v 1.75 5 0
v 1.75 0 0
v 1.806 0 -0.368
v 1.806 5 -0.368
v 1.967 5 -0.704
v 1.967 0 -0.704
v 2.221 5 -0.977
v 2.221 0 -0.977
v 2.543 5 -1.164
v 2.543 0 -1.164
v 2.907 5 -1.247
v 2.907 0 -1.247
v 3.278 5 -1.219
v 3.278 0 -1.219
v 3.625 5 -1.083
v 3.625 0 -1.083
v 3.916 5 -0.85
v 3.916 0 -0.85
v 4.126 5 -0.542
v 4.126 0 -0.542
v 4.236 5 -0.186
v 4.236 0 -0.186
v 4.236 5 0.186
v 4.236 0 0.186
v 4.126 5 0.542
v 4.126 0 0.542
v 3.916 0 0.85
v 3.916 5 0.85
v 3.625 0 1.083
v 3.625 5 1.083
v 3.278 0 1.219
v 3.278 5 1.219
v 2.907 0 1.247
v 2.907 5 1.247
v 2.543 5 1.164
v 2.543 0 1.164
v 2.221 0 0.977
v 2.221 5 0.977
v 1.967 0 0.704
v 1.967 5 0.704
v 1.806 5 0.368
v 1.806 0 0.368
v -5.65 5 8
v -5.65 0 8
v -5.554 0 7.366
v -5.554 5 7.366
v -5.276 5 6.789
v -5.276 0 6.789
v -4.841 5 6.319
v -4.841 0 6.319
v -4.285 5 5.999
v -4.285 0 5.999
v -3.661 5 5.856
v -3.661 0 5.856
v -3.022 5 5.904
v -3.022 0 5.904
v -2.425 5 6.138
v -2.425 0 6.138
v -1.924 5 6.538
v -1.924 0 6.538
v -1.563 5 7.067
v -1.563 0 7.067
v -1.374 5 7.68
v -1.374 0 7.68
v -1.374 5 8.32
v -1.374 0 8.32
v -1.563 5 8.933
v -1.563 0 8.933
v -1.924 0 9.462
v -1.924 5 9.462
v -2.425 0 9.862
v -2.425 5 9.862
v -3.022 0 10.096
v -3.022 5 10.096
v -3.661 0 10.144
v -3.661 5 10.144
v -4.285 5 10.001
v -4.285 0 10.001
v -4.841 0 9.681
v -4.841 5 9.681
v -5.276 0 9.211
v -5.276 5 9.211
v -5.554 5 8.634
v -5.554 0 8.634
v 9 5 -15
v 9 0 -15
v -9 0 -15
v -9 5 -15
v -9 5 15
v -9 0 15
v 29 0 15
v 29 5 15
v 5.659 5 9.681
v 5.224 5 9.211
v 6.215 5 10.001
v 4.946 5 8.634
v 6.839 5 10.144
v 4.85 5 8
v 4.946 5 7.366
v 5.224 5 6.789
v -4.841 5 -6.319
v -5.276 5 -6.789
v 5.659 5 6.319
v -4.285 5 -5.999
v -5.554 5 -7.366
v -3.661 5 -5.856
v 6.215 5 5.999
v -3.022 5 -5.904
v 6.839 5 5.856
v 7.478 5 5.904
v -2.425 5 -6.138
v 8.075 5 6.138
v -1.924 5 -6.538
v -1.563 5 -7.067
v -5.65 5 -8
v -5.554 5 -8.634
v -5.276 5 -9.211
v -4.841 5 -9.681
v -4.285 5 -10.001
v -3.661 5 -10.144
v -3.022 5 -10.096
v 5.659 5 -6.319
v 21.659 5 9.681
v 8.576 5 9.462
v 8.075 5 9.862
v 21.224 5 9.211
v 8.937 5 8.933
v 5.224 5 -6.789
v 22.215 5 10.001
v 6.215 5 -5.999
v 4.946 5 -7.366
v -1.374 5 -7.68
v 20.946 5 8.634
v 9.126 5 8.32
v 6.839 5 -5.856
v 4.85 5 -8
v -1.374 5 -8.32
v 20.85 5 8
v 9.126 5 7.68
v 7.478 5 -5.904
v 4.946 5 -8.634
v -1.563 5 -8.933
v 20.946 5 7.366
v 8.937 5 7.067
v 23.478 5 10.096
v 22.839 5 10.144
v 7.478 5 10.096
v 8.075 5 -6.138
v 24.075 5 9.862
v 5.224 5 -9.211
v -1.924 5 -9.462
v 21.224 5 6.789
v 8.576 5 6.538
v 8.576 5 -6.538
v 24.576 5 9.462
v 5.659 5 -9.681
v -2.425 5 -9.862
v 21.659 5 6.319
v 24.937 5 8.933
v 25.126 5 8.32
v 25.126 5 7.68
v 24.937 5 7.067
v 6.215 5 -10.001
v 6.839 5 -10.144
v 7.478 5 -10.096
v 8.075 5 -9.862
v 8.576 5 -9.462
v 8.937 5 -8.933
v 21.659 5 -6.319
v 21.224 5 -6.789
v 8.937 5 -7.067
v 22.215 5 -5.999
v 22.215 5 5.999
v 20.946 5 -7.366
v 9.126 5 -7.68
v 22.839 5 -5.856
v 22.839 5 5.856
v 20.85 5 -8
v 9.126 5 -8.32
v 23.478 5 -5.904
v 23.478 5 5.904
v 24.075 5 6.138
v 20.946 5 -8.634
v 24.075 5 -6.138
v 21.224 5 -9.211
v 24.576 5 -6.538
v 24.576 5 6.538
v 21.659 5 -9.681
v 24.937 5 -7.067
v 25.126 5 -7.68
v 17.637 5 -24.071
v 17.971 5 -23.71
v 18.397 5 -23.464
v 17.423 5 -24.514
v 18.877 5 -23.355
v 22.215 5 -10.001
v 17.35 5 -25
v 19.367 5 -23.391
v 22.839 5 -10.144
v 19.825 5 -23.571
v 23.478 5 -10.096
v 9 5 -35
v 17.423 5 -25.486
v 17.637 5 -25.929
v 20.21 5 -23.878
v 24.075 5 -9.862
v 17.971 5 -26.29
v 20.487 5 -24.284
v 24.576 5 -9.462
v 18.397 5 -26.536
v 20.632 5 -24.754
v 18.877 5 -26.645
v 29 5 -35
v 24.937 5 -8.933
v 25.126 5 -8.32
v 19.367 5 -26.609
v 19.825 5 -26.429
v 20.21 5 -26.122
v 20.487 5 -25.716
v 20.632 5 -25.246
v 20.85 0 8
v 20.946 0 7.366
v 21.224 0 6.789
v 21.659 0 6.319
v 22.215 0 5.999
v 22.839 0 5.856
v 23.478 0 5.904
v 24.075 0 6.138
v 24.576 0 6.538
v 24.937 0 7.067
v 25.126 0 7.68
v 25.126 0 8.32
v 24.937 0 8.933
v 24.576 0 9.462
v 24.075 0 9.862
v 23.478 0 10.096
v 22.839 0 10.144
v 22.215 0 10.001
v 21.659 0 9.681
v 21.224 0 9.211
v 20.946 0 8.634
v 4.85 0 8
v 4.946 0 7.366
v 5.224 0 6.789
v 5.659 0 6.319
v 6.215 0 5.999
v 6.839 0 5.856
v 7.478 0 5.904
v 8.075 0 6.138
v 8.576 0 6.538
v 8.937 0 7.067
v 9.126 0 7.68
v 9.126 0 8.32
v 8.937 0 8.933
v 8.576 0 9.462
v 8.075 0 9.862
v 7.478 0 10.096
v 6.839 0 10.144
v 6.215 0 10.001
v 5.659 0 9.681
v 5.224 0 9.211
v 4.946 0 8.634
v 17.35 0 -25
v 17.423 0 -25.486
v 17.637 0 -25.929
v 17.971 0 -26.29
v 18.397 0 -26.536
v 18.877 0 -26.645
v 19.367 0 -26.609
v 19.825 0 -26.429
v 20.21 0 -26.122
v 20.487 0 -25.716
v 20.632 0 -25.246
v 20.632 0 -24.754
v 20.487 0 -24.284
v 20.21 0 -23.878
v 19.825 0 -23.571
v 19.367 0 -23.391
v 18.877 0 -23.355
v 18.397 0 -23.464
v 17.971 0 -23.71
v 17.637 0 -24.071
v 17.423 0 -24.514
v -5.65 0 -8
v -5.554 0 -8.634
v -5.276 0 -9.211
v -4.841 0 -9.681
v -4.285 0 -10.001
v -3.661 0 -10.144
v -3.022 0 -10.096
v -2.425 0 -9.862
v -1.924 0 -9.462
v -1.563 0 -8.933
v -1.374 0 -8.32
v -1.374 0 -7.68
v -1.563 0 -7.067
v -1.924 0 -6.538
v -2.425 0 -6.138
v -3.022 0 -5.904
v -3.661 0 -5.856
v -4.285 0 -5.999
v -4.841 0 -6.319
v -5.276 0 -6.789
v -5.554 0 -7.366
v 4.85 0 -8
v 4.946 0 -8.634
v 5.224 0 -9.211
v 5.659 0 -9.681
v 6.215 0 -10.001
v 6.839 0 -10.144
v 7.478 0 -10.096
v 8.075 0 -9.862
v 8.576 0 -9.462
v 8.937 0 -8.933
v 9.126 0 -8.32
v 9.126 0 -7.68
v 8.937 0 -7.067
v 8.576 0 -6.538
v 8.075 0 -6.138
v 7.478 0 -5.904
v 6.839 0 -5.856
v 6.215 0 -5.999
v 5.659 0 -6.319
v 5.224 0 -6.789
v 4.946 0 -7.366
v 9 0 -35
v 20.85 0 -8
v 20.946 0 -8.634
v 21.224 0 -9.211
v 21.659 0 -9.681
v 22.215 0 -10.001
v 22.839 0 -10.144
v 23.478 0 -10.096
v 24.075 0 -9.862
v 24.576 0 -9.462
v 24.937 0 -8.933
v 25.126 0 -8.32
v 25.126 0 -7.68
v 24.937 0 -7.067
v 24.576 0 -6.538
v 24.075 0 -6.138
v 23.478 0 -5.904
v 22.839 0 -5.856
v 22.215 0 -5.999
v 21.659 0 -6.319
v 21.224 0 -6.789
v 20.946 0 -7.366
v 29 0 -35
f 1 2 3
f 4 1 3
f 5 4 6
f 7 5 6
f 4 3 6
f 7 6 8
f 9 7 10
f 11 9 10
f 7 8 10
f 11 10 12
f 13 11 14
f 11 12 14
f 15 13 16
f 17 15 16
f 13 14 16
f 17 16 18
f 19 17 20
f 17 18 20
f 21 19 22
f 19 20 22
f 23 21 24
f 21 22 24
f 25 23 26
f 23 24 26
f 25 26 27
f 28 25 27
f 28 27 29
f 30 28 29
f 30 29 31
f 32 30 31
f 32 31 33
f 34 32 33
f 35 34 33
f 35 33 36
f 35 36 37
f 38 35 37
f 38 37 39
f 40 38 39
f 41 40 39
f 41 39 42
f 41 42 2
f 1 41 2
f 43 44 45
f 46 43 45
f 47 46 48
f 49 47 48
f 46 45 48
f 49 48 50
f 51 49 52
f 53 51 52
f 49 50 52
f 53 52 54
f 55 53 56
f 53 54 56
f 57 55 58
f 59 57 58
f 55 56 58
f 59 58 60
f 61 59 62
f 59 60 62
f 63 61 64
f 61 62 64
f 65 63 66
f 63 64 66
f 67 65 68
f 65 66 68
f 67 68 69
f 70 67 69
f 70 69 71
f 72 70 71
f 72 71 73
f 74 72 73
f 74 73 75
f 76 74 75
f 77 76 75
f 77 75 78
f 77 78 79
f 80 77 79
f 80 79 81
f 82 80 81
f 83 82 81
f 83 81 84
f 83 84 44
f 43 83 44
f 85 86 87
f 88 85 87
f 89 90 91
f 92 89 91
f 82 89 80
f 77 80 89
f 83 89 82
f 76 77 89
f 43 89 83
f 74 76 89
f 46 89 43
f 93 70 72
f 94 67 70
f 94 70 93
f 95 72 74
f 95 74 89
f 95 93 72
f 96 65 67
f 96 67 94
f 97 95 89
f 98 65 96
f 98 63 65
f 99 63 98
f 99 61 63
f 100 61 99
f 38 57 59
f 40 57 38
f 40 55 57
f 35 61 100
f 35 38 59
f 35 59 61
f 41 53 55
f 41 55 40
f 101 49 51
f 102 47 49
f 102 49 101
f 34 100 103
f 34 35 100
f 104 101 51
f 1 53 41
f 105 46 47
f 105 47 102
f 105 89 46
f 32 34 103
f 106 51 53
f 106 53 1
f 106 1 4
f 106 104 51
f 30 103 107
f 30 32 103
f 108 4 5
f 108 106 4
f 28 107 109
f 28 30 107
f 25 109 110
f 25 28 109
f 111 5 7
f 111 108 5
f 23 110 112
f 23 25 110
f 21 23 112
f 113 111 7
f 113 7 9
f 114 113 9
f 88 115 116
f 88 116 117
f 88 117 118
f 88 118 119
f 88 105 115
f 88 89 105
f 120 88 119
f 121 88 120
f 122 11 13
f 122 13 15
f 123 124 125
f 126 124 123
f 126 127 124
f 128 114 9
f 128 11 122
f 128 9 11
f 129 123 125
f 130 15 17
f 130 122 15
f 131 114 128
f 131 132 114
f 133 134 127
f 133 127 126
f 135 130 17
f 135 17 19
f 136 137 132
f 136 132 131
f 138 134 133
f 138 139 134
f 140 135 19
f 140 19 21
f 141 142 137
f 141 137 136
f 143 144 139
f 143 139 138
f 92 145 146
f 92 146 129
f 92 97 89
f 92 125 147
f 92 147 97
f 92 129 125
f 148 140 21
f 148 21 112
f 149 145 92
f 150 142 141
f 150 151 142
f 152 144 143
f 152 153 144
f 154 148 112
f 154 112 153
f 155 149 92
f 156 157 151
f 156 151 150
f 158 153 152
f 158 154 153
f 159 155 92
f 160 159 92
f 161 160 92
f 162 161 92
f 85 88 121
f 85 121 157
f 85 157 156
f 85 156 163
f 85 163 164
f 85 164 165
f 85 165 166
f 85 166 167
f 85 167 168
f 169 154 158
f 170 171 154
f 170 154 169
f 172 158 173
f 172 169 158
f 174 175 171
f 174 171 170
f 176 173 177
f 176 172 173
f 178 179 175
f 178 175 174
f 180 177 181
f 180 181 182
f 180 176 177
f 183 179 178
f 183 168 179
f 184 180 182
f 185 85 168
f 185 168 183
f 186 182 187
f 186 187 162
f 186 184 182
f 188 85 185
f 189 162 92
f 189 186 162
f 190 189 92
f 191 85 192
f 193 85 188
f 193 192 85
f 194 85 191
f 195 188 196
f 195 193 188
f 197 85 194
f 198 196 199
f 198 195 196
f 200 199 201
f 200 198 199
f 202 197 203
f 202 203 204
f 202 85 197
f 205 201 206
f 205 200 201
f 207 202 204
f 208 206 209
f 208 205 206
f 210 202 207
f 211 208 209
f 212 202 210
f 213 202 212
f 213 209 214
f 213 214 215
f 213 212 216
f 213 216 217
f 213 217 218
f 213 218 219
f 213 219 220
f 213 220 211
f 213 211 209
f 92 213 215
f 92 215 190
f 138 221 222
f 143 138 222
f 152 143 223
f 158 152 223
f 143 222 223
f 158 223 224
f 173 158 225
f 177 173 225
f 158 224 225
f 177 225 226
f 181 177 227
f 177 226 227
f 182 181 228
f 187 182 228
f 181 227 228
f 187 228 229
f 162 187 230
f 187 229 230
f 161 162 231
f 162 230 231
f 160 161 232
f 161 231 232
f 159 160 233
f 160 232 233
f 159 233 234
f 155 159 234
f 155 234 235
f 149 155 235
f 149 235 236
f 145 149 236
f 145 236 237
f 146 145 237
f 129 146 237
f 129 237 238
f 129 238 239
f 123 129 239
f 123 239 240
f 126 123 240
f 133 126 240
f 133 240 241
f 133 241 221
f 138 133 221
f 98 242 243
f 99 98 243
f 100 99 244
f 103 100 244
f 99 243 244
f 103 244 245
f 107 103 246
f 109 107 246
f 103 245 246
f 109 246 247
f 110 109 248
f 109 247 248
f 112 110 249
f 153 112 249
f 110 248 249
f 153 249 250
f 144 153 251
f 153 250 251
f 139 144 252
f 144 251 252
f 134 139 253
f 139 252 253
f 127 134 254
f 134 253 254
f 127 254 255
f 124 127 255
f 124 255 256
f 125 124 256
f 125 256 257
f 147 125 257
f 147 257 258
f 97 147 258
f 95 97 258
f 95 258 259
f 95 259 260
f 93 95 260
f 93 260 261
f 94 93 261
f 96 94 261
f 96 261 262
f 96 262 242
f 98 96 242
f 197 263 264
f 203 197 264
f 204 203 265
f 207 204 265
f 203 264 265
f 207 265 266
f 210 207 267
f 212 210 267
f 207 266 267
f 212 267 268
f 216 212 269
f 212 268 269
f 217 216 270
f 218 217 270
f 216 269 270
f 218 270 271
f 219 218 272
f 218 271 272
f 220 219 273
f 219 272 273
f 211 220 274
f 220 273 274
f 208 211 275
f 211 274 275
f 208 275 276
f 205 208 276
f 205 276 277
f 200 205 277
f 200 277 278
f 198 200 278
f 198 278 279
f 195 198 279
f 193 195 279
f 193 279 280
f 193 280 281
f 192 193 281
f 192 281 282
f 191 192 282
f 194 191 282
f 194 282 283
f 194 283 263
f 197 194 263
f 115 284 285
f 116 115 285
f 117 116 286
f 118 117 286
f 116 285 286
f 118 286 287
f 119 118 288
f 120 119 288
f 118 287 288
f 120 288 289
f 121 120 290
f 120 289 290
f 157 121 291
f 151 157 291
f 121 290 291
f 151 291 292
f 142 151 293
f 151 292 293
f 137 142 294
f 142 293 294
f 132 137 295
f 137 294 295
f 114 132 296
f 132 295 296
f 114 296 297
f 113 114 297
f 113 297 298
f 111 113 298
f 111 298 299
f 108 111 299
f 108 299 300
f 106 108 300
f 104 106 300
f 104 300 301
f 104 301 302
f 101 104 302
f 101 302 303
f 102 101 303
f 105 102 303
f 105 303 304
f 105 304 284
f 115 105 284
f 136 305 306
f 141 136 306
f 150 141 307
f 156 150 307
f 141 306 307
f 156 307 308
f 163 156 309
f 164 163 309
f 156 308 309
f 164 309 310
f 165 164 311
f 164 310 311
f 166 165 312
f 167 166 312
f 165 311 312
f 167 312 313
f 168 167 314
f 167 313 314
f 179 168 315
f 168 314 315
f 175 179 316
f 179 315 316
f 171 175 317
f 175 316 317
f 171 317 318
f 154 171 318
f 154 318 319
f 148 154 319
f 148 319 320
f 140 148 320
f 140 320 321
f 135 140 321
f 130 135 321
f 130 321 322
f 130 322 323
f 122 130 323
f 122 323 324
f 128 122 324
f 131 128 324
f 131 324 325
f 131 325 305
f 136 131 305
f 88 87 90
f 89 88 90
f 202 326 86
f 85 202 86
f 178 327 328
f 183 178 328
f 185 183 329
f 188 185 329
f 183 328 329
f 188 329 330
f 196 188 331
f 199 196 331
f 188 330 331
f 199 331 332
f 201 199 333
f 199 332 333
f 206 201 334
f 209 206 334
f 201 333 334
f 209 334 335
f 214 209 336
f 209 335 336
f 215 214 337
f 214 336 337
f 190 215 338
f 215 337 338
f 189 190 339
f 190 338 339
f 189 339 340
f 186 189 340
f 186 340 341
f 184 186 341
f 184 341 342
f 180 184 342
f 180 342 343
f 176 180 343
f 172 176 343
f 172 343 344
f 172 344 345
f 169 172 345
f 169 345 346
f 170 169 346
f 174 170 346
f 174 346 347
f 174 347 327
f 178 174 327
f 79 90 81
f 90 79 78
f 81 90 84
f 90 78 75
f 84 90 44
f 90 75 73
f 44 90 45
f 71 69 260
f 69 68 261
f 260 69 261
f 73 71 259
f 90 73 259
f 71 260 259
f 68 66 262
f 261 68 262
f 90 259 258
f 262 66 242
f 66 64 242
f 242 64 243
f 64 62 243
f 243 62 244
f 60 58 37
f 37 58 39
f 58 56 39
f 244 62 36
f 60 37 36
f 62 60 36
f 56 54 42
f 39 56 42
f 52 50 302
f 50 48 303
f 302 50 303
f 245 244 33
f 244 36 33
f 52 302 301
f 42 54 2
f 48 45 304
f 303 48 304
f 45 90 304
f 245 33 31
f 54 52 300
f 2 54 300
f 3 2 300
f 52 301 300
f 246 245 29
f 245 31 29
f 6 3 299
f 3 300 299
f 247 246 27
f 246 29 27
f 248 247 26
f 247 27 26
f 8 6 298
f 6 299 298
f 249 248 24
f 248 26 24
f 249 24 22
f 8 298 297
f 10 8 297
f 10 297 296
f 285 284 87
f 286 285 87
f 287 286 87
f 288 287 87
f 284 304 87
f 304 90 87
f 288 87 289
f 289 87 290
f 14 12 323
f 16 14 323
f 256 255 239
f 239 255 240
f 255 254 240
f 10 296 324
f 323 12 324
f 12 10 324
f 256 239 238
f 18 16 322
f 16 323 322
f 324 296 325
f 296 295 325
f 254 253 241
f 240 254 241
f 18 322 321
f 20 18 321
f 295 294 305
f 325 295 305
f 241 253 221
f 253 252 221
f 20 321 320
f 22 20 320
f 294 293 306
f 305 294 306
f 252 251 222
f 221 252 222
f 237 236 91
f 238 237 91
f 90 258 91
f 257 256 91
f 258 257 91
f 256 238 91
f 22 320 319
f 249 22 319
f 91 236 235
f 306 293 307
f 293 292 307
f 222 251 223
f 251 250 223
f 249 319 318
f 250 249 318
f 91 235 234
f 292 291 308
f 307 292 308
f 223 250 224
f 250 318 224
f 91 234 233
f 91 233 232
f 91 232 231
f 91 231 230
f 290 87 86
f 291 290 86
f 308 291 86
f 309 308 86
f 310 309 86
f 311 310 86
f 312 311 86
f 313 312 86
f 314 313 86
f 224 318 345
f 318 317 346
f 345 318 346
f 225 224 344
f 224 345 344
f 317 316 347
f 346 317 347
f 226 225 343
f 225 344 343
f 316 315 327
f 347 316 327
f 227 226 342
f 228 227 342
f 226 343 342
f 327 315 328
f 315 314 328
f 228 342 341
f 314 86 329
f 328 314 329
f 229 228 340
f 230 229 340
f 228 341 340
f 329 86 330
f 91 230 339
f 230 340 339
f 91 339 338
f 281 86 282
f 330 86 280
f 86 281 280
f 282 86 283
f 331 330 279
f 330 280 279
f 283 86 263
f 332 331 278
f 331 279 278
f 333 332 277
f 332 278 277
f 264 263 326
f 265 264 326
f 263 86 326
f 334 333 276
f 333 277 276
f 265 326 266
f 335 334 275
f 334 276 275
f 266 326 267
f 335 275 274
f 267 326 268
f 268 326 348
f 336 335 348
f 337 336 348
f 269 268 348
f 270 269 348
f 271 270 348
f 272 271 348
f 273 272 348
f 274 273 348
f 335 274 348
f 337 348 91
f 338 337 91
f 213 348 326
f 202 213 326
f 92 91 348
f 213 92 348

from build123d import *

# Parameters (mm, degrees)
AUFSATZ_LINEAR_AUSTRAGEN1_DEPTH = 5
DURCHGANGSLOCH_F_R_M41_D        = 4.3
DURCHGANGSLOCH_F_R_M42_D        = 4.3
M4_GEWINDEBOHRUNG1_D            = 3.3
M3_GEWINDEBOHRUNG1_D            = 2.5


with BuildPart() as part:
    # Skizze1 → Aufsatz-Linear austragen1 (new body)
    with BuildSketch(Plane(origin=(0, 0, 0), x_dir=(1, 0, 0), z_dir=(0, 1, 0))):
        Polygon((-9, 15), (-9, -15), (29, -15), (29, 35), (9, 35), (9, 15), align=None)
    extrude(amount=AUFSATZ_LINEAR_AUSTRAGEN1_DEPTH)

    # Durchgangsloch für M41 (through all)
    with Locations(Plane(origin=(0, 5, 0), x_dir=(1, 0, 0), z_dir=(0, 1, 0))):
        with Locations((7, 8), (23, 8), (7, -8), (23, -8)):
            Hole(DURCHGANGSLOCH_F_R_M41_D / 2)

    # Durchgangsloch für M42 (through all)
    with Locations(Plane(origin=(0, 5, 0), x_dir=(1, 0, 0), z_dir=(0, 1, 0))):
        with Locations((-3.5, 8), (-3.5, -8)):
            Hole(DURCHGANGSLOCH_F_R_M42_D / 2)

    # M4 Gewindebohrung1 (through all)
    with Locations(Plane(origin=(0, 5, 0), x_dir=(1, 0, 0), z_dir=(0, 1, 0))):
        with Locations((19, 25)):
            Hole(M4_GEWINDEBOHRUNG1_D / 2)

    # M3 Gewindebohrung1 (through all)
    with Locations(Plane(origin=(0, 5, 0), x_dir=(1, 0, 0), z_dir=(0, 1, 0))):
        with Locations((3, 0)):
            Hole(M3_GEWINDEBOHRUNG1_D / 2)


solid = part.part
